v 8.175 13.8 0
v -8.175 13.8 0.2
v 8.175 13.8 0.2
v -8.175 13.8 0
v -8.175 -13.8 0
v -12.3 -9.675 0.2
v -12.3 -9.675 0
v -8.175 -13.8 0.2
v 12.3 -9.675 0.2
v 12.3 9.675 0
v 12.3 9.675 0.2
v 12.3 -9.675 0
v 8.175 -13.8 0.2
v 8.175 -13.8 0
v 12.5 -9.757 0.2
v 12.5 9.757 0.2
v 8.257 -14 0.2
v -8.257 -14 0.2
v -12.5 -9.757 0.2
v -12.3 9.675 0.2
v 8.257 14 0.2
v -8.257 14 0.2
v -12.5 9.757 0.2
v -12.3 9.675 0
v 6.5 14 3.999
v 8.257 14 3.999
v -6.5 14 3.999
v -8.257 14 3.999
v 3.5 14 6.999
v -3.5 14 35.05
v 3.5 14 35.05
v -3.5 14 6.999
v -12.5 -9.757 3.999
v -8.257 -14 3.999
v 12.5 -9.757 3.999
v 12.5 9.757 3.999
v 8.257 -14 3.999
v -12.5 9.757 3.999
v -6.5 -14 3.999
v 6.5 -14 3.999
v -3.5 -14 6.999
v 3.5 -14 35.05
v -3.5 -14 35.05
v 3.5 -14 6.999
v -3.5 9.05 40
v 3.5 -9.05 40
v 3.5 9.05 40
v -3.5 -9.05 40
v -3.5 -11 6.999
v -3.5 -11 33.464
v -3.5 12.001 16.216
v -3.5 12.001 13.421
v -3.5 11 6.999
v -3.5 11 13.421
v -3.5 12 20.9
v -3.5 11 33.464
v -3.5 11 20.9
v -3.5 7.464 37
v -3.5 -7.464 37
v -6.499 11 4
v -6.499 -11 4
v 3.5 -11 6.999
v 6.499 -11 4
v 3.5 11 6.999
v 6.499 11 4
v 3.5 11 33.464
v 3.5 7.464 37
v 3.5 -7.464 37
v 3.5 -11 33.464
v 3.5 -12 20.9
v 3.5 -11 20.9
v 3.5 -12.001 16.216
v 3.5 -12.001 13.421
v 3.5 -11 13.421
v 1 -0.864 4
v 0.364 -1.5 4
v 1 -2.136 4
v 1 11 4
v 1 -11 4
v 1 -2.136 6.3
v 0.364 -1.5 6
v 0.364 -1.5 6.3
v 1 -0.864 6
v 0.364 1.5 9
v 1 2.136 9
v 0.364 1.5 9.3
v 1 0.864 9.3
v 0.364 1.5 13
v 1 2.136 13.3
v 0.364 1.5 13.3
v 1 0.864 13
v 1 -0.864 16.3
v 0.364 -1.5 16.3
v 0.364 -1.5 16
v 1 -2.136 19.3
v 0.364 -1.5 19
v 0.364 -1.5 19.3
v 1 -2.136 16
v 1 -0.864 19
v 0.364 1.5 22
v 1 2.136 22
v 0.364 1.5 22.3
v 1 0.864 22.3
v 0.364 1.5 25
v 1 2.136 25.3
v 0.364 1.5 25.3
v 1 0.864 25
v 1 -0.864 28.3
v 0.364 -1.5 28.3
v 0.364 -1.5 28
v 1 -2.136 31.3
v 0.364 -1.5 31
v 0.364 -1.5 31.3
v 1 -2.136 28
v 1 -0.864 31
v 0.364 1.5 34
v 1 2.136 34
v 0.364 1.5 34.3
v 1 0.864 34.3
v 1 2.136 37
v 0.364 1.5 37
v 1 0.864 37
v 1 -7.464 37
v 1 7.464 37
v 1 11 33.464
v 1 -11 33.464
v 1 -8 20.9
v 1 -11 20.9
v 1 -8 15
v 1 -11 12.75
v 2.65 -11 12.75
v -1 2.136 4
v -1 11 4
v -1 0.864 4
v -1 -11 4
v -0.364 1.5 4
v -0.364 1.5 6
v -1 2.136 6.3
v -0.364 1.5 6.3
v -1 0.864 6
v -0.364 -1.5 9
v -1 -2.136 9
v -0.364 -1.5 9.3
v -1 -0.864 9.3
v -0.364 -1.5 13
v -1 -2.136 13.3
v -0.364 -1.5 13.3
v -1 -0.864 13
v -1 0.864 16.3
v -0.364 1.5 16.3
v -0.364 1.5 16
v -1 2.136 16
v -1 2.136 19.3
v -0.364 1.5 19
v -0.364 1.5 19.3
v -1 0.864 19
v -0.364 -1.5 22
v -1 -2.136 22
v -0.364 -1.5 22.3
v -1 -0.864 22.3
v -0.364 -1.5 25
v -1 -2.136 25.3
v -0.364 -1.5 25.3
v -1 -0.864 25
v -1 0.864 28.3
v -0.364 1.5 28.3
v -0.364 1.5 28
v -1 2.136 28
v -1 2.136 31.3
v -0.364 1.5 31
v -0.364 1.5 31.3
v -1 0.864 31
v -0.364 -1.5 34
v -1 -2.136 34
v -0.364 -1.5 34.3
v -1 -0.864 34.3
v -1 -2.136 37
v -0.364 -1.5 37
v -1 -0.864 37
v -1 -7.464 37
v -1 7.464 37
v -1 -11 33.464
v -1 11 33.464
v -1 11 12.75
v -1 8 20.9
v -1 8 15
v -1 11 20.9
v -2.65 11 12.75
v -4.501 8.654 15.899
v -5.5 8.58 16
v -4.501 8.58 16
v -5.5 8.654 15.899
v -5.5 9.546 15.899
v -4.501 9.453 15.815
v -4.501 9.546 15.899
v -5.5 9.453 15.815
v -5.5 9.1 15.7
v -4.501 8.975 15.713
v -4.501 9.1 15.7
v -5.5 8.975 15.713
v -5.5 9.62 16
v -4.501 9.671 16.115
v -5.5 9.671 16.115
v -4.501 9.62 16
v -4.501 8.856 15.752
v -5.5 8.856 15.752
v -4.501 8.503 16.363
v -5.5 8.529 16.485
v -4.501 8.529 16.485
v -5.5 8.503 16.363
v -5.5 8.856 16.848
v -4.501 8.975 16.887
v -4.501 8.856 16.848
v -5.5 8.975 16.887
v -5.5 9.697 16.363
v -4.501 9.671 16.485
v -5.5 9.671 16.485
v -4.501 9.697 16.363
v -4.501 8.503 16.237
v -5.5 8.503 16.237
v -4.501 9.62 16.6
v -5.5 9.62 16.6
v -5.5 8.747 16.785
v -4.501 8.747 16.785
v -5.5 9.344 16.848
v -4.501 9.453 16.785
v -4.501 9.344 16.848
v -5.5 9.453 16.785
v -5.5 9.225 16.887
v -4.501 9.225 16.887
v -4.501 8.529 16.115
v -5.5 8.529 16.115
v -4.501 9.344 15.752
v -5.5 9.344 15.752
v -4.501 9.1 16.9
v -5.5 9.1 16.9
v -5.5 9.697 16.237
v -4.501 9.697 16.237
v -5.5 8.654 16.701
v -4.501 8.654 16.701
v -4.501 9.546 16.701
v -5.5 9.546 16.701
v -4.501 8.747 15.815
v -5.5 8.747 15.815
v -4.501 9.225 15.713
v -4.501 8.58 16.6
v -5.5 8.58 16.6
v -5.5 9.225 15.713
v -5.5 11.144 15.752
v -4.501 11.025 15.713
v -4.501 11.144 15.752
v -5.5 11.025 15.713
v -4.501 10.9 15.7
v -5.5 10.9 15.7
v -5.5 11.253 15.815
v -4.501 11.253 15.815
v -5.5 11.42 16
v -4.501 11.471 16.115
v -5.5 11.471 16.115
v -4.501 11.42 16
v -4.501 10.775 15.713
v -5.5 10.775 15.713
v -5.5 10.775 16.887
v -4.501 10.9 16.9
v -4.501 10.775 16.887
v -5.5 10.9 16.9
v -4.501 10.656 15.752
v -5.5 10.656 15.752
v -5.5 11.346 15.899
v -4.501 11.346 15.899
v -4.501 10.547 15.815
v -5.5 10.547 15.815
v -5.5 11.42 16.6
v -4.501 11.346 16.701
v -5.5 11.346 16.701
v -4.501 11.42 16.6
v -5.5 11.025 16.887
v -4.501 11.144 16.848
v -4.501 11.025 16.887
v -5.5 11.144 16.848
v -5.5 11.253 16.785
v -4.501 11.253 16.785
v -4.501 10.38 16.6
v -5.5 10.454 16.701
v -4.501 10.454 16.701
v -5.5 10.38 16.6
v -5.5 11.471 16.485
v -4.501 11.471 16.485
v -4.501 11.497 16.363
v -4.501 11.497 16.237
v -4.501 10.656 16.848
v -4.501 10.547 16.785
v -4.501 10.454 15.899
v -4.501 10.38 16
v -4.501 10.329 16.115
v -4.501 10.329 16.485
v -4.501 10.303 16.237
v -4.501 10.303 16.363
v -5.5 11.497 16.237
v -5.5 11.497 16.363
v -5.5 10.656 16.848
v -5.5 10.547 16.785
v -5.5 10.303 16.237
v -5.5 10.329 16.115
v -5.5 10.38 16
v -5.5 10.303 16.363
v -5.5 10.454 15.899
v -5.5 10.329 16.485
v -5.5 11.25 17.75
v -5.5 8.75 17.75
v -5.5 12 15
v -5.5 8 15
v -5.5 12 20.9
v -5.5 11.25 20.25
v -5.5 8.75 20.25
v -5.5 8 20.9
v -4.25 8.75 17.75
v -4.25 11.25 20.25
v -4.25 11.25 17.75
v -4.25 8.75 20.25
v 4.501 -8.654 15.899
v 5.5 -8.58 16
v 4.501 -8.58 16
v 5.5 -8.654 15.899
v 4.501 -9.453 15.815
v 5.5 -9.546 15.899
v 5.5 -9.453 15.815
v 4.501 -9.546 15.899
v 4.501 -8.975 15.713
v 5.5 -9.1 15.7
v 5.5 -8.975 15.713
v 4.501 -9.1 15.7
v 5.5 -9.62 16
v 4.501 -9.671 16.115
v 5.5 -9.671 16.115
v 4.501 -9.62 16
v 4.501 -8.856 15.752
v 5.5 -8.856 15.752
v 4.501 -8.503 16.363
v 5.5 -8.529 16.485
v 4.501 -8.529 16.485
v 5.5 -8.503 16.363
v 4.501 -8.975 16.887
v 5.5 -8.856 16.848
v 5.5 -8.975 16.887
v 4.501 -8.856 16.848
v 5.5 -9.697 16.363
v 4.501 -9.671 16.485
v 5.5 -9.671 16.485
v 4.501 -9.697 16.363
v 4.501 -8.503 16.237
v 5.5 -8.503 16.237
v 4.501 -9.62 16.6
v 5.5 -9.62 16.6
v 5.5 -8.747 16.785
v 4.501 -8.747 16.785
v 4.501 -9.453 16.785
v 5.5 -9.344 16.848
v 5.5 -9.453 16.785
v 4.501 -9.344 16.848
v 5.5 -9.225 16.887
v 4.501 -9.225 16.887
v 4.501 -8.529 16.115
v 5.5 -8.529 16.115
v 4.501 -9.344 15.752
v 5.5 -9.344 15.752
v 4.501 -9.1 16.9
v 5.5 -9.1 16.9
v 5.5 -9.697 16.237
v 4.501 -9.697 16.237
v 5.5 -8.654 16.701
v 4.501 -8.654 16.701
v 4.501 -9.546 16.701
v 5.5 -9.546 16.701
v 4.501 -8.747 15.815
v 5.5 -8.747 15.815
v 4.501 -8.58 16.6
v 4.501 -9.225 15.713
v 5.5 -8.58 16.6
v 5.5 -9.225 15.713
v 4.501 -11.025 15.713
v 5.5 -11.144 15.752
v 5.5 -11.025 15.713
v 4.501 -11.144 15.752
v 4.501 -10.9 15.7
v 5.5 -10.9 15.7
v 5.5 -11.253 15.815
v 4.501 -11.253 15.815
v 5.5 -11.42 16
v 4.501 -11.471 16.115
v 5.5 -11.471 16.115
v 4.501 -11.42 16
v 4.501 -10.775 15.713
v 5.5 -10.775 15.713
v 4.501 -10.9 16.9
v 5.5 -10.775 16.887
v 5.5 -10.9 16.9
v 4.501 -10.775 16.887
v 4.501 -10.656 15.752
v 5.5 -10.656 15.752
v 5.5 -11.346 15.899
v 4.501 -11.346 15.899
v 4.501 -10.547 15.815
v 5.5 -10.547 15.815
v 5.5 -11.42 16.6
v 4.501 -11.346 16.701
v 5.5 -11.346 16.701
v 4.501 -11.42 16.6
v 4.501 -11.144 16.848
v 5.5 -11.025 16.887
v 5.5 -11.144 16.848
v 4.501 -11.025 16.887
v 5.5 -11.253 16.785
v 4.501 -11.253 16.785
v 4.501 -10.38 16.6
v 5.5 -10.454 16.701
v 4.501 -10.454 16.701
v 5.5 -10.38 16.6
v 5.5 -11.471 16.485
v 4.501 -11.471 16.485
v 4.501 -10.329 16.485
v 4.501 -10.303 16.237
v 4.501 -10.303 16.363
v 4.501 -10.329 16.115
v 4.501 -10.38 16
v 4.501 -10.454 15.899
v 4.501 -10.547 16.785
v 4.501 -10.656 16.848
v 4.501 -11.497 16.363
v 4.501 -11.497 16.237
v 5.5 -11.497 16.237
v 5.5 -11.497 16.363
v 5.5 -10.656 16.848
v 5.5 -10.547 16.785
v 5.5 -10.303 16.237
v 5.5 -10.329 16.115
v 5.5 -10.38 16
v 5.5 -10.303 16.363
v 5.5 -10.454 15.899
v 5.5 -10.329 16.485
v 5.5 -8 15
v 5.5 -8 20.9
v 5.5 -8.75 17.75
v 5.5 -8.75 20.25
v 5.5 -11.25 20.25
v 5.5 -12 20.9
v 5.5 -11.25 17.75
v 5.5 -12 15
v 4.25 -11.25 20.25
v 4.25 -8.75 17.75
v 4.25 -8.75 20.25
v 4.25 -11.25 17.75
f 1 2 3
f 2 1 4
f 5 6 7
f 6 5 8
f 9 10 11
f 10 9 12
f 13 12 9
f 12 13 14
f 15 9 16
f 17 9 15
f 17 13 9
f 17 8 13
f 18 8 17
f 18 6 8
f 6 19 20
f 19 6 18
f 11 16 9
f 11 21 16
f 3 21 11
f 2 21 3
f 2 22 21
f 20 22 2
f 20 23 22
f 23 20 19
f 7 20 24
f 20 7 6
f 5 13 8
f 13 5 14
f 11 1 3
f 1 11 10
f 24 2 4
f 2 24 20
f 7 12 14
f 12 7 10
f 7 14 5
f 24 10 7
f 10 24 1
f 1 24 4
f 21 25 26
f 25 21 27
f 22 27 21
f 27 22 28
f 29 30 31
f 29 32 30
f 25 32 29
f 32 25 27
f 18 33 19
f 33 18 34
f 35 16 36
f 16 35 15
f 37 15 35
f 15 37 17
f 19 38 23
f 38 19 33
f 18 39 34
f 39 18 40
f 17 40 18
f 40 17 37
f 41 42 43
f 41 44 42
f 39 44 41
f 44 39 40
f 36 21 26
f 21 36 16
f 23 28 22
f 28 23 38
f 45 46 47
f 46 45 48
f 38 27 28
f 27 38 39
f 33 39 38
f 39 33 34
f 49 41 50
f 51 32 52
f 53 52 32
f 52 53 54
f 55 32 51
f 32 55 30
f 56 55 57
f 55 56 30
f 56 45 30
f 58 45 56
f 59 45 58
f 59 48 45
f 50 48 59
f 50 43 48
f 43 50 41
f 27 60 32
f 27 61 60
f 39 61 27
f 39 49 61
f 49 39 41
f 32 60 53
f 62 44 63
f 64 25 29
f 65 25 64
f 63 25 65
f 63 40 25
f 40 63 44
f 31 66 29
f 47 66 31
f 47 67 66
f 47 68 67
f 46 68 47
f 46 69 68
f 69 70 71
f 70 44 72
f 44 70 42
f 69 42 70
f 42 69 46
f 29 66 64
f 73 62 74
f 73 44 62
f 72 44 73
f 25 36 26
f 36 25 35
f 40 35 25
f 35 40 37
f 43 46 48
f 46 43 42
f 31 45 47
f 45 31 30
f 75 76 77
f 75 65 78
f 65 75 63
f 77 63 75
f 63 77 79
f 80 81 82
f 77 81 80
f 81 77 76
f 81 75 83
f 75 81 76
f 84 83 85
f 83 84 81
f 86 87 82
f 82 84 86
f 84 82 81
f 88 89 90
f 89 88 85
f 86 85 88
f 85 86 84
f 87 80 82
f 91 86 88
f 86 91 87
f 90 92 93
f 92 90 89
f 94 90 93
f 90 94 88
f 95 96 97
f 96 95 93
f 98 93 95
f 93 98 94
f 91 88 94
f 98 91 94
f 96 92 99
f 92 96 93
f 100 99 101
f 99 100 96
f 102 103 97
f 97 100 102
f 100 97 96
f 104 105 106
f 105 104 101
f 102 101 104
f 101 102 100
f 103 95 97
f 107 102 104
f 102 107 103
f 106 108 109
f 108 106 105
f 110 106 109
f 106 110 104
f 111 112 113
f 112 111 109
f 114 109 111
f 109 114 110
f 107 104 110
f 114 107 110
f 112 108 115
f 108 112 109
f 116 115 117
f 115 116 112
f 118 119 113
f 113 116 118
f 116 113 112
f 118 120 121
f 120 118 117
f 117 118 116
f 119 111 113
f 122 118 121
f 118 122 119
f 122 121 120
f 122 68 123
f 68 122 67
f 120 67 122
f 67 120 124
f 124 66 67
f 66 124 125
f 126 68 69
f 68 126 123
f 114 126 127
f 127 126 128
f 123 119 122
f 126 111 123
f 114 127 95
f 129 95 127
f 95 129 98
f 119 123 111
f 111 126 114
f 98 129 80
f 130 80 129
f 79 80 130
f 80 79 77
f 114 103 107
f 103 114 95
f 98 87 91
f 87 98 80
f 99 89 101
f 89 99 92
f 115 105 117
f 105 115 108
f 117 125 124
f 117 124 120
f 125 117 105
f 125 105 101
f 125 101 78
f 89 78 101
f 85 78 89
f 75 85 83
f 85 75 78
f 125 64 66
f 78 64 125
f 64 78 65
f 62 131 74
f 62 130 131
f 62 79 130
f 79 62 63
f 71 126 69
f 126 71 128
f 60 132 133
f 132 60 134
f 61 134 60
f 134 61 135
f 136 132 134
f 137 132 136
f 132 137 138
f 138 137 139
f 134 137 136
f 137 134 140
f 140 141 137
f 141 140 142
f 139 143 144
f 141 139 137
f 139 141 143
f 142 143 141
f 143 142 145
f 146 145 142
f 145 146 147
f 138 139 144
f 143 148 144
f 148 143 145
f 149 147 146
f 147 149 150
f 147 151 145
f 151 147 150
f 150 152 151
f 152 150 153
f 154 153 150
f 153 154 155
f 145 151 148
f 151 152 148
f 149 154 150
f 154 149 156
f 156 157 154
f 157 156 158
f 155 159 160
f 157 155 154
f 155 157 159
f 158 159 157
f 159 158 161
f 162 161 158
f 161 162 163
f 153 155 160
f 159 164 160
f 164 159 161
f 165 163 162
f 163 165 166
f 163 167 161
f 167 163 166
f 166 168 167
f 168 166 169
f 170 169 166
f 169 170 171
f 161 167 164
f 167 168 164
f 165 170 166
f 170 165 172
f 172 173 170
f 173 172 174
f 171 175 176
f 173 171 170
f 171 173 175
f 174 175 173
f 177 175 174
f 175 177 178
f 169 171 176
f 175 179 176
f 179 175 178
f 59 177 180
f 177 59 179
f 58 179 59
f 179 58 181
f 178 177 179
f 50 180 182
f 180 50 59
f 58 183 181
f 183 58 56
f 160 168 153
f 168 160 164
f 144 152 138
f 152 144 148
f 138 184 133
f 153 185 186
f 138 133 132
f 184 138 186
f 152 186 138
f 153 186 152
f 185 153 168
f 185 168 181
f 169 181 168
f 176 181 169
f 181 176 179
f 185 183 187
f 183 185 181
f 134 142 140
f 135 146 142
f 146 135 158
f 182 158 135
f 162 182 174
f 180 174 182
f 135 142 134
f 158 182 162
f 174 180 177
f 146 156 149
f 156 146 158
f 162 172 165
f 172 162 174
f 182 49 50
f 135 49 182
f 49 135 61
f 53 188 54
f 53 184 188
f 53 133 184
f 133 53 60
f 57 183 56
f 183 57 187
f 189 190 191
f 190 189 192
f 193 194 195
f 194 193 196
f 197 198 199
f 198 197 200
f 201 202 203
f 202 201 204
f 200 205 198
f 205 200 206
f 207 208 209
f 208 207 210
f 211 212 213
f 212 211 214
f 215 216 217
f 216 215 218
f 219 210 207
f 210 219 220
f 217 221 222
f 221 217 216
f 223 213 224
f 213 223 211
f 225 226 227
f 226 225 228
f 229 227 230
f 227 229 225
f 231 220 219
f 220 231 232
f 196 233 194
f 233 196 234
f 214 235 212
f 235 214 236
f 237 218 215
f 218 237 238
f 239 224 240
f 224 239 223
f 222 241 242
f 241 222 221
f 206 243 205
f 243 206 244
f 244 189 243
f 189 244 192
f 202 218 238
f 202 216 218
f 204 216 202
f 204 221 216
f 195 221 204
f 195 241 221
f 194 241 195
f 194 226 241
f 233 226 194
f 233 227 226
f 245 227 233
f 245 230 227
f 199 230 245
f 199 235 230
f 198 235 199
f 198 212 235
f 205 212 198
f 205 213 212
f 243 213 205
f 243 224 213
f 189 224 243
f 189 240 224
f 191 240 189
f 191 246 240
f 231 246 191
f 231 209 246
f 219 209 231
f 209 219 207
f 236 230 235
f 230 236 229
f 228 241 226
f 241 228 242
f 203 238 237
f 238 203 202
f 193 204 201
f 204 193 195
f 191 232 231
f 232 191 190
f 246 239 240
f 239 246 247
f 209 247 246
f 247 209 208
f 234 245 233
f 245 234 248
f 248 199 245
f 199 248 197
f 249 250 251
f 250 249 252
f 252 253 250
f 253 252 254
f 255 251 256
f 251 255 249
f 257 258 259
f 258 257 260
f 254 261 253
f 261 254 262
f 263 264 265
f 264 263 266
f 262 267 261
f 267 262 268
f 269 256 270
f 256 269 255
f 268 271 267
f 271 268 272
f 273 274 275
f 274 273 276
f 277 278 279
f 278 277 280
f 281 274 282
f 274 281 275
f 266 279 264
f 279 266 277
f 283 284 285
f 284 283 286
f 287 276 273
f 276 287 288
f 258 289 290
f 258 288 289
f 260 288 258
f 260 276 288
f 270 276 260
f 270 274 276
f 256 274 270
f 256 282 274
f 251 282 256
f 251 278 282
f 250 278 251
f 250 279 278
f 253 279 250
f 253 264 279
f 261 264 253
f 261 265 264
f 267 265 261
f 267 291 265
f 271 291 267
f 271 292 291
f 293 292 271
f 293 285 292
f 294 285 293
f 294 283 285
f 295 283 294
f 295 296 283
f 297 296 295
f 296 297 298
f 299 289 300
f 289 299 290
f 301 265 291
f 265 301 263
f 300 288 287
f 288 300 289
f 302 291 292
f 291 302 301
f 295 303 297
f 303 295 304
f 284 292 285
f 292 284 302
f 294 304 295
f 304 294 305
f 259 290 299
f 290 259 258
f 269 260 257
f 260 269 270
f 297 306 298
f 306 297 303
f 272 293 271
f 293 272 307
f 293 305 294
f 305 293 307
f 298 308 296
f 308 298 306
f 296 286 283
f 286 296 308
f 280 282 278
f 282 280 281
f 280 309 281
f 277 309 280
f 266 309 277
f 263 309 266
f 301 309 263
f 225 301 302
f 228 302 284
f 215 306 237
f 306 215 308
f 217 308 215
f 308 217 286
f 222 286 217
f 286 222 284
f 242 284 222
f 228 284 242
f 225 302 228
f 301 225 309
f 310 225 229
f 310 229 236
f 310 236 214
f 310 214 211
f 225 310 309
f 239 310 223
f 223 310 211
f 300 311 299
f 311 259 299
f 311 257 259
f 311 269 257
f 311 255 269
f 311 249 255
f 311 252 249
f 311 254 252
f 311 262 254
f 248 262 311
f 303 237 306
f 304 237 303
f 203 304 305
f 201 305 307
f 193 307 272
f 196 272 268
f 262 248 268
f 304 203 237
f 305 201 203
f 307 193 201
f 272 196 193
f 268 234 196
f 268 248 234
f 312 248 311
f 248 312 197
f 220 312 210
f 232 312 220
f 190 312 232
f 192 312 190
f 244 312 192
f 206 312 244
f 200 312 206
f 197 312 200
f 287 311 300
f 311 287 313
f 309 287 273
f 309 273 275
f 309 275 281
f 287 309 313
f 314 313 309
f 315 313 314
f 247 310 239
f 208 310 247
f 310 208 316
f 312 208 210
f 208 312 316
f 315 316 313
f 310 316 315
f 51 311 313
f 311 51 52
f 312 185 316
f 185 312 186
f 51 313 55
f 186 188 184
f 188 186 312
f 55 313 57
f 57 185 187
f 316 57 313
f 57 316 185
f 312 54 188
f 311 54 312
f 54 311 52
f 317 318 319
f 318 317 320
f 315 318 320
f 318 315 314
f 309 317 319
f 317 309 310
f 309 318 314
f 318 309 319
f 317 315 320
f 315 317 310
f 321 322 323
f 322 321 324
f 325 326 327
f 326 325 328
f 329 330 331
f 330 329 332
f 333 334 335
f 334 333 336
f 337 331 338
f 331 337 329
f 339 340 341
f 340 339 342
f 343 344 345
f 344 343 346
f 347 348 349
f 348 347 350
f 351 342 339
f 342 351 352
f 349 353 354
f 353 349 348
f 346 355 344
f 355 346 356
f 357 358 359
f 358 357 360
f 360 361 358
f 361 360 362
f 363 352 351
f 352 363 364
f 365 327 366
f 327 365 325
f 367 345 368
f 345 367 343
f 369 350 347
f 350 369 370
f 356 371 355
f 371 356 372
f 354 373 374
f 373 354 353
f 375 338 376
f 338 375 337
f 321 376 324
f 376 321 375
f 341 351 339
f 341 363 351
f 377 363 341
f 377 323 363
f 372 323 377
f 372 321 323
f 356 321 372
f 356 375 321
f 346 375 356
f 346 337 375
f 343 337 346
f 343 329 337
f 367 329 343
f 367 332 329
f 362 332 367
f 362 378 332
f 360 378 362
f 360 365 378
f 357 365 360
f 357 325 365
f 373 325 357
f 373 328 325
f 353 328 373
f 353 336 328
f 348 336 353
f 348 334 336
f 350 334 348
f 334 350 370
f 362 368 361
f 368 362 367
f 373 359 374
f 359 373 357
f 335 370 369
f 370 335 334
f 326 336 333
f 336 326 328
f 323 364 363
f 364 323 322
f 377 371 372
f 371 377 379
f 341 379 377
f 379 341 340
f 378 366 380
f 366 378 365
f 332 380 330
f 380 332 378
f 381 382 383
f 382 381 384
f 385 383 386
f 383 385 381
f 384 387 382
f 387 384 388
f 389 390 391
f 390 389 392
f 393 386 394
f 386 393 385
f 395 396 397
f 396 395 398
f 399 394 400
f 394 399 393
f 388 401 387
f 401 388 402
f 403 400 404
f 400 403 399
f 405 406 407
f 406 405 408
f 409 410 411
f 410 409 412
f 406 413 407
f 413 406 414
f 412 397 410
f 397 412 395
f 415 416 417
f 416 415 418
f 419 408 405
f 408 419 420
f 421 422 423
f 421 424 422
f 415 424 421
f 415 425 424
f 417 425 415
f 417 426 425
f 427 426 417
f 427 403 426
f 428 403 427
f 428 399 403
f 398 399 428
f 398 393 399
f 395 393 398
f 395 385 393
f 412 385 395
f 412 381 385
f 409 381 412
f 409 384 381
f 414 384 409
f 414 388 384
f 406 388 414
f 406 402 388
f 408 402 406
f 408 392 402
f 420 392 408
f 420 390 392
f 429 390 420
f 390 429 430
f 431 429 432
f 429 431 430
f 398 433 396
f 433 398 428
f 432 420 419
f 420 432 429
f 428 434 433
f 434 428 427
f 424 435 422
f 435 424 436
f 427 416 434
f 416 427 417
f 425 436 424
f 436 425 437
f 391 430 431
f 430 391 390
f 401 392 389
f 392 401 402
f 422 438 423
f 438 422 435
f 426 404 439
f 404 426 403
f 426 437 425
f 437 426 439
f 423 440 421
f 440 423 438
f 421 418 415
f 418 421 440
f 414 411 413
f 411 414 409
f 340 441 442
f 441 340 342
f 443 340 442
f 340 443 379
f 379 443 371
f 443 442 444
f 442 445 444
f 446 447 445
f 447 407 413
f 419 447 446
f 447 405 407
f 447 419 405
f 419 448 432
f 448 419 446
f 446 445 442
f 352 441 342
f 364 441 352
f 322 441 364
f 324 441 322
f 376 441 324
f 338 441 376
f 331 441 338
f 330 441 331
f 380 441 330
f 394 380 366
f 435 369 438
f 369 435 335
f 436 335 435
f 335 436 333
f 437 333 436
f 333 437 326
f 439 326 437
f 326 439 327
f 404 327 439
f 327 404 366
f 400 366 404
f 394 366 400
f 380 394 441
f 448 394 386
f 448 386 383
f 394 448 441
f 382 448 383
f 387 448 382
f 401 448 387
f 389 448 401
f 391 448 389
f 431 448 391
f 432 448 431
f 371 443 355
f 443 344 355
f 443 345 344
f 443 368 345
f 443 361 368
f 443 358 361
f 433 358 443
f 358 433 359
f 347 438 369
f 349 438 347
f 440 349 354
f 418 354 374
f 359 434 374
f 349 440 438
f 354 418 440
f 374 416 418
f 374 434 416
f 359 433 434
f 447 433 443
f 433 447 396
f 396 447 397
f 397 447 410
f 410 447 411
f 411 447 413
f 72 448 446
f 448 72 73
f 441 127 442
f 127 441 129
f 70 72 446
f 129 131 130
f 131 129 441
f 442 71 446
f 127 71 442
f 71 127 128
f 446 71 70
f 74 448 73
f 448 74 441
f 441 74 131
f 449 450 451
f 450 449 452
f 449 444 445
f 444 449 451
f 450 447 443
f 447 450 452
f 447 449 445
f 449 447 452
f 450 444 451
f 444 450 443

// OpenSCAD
eps = 0.001;
layer = 0.2;

// Same height as a marine figure.
height = 40;
widthx = 25; 
widthy = 28;

base_height = 4;
frame_depth = 7;

module exterior_2d() {
  difference() {
    square([widthx, widthy], center=true);
    
    // Chamfer corners.
    for (a = [-1, 1], b = [-1, 1])
      scale([a, b])
        translate([widthx/2, widthy/2])
          rotate([0, 0, 45])
            square(6, center=true);
  }
}

module exterior() {
  // Base.
  linear_extrude(layer)
    offset(-0.2)
      exterior_2d();
  translate([0, 0, layer])
    linear_extrude(base_height - layer)
      exterior_2d();

  // Above the base.
  translate([0, 0, base_height])
    linear_extrude(height - base_height)
      square([widthx, widthy], center=true);
}

module buttons() {
  $fn = 30;
  
  difference() {
    hull() {
      cube([5, 4, 5.9]);
      translate([3.8, 4, -3])
        cube([1, eps, eps]);
    }
    
    translate([-1.25, 0.75, 2.75])
      cube(2.5);
  
    translate([0, 2, 2.2])
      rotate([0, 90, 0])
        for (a = [-1, 1])
          scale([1, a, 1])
            translate([0.9, 0.9, -eps])
              cylinder(d=1.2, h=1);
  }
}

module crack_atom() {
  linear_extrude(0.3)
    rotate([0, 0, 45])
      square(0.9, center=true);
}

module crack() {
  hull() {
    translate([0, 0, 2]) crack_atom();
    translate([0, 0, 4]) crack_atom();
  }
  hull() {
    translate([0, 0, 4]) crack_atom();
    translate([0, 3, 7]) crack_atom();
  }
  hull() {
    translate([0, 3, 7]) crack_atom();
    translate([0, 3, 11]) crack_atom();
  }
  hull() {
    translate([0, 3, 11]) crack_atom();
    translate([0, 0, 14]) crack_atom();
  }
  hull() {
    translate([0, 0, 14]) crack_atom();
    translate([0, 0, 17]) crack_atom();
  }
  hull() {
    translate([0, 0, 17]) crack_atom();
    translate([0, 3, 20]) crack_atom();
  }
  hull() {
    translate([0, 3, 20]) crack_atom();
    translate([0, 3, 23]) crack_atom();
  }
  hull() {
    translate([0, 3, 23]) crack_atom();
    translate([0, 0, 26]) crack_atom();
  }
  hull() {
    translate([0, 0, 26]) crack_atom();
    translate([0, 0, 29]) crack_atom();
  }
  hull() {
    translate([0, 0, 29]) crack_atom();
    translate([0, 3, 32]) crack_atom();
  }
  hull() {
    translate([0, 3, 32]) crack_atom();
    translate([0, 3, 34.7]) crack_atom();
  }
}

module door() {
  difference() {
    exterior();
    
    // Cut away front and back of frame.
    for (a = [-1, 1]) {
      scale([a, 1]) {
        translate([frame_depth/2, -50, base_height-eps]) {
          hull() {
            fillet = 3;
            translate([fillet, 0, 0]) cube(100);
            translate([0, 0, fillet]) cube(100);
          }
        }
      }
    }
    
    // Chamfer top corners.
    for (a = [-1, 1])
      scale([1, a])
        translate([0, widthy/2, height])
          rotate([45, 0, 0])
            cube([20, 7, 7], center=true);
    
    // Emboss a door.
    for (b = [0, 180]) {
      emboss_width = widthy - 6;
      
      rotate([0, 0, b]) {
        translate([1, -1.5, base_height-2])
          crack();

        difference() {
          translate([1, -emboss_width/2, base_height])
            cube([20, emboss_width, height - 3 - base_height]);
          
          for (a = [-1, 1])
            scale([1, a])
              translate([1, -emboss_width/2, height - 3])
                rotate([45, 0, 0])
                  cube([20, 5, 5], center=true);
        }
      }
    }
  }
  
  // Control buttons.
  for (a = [0, 180])
    rotate([0, 0, a])
      translate([-5.5, 8, 15])
        buttons();
}

door();
